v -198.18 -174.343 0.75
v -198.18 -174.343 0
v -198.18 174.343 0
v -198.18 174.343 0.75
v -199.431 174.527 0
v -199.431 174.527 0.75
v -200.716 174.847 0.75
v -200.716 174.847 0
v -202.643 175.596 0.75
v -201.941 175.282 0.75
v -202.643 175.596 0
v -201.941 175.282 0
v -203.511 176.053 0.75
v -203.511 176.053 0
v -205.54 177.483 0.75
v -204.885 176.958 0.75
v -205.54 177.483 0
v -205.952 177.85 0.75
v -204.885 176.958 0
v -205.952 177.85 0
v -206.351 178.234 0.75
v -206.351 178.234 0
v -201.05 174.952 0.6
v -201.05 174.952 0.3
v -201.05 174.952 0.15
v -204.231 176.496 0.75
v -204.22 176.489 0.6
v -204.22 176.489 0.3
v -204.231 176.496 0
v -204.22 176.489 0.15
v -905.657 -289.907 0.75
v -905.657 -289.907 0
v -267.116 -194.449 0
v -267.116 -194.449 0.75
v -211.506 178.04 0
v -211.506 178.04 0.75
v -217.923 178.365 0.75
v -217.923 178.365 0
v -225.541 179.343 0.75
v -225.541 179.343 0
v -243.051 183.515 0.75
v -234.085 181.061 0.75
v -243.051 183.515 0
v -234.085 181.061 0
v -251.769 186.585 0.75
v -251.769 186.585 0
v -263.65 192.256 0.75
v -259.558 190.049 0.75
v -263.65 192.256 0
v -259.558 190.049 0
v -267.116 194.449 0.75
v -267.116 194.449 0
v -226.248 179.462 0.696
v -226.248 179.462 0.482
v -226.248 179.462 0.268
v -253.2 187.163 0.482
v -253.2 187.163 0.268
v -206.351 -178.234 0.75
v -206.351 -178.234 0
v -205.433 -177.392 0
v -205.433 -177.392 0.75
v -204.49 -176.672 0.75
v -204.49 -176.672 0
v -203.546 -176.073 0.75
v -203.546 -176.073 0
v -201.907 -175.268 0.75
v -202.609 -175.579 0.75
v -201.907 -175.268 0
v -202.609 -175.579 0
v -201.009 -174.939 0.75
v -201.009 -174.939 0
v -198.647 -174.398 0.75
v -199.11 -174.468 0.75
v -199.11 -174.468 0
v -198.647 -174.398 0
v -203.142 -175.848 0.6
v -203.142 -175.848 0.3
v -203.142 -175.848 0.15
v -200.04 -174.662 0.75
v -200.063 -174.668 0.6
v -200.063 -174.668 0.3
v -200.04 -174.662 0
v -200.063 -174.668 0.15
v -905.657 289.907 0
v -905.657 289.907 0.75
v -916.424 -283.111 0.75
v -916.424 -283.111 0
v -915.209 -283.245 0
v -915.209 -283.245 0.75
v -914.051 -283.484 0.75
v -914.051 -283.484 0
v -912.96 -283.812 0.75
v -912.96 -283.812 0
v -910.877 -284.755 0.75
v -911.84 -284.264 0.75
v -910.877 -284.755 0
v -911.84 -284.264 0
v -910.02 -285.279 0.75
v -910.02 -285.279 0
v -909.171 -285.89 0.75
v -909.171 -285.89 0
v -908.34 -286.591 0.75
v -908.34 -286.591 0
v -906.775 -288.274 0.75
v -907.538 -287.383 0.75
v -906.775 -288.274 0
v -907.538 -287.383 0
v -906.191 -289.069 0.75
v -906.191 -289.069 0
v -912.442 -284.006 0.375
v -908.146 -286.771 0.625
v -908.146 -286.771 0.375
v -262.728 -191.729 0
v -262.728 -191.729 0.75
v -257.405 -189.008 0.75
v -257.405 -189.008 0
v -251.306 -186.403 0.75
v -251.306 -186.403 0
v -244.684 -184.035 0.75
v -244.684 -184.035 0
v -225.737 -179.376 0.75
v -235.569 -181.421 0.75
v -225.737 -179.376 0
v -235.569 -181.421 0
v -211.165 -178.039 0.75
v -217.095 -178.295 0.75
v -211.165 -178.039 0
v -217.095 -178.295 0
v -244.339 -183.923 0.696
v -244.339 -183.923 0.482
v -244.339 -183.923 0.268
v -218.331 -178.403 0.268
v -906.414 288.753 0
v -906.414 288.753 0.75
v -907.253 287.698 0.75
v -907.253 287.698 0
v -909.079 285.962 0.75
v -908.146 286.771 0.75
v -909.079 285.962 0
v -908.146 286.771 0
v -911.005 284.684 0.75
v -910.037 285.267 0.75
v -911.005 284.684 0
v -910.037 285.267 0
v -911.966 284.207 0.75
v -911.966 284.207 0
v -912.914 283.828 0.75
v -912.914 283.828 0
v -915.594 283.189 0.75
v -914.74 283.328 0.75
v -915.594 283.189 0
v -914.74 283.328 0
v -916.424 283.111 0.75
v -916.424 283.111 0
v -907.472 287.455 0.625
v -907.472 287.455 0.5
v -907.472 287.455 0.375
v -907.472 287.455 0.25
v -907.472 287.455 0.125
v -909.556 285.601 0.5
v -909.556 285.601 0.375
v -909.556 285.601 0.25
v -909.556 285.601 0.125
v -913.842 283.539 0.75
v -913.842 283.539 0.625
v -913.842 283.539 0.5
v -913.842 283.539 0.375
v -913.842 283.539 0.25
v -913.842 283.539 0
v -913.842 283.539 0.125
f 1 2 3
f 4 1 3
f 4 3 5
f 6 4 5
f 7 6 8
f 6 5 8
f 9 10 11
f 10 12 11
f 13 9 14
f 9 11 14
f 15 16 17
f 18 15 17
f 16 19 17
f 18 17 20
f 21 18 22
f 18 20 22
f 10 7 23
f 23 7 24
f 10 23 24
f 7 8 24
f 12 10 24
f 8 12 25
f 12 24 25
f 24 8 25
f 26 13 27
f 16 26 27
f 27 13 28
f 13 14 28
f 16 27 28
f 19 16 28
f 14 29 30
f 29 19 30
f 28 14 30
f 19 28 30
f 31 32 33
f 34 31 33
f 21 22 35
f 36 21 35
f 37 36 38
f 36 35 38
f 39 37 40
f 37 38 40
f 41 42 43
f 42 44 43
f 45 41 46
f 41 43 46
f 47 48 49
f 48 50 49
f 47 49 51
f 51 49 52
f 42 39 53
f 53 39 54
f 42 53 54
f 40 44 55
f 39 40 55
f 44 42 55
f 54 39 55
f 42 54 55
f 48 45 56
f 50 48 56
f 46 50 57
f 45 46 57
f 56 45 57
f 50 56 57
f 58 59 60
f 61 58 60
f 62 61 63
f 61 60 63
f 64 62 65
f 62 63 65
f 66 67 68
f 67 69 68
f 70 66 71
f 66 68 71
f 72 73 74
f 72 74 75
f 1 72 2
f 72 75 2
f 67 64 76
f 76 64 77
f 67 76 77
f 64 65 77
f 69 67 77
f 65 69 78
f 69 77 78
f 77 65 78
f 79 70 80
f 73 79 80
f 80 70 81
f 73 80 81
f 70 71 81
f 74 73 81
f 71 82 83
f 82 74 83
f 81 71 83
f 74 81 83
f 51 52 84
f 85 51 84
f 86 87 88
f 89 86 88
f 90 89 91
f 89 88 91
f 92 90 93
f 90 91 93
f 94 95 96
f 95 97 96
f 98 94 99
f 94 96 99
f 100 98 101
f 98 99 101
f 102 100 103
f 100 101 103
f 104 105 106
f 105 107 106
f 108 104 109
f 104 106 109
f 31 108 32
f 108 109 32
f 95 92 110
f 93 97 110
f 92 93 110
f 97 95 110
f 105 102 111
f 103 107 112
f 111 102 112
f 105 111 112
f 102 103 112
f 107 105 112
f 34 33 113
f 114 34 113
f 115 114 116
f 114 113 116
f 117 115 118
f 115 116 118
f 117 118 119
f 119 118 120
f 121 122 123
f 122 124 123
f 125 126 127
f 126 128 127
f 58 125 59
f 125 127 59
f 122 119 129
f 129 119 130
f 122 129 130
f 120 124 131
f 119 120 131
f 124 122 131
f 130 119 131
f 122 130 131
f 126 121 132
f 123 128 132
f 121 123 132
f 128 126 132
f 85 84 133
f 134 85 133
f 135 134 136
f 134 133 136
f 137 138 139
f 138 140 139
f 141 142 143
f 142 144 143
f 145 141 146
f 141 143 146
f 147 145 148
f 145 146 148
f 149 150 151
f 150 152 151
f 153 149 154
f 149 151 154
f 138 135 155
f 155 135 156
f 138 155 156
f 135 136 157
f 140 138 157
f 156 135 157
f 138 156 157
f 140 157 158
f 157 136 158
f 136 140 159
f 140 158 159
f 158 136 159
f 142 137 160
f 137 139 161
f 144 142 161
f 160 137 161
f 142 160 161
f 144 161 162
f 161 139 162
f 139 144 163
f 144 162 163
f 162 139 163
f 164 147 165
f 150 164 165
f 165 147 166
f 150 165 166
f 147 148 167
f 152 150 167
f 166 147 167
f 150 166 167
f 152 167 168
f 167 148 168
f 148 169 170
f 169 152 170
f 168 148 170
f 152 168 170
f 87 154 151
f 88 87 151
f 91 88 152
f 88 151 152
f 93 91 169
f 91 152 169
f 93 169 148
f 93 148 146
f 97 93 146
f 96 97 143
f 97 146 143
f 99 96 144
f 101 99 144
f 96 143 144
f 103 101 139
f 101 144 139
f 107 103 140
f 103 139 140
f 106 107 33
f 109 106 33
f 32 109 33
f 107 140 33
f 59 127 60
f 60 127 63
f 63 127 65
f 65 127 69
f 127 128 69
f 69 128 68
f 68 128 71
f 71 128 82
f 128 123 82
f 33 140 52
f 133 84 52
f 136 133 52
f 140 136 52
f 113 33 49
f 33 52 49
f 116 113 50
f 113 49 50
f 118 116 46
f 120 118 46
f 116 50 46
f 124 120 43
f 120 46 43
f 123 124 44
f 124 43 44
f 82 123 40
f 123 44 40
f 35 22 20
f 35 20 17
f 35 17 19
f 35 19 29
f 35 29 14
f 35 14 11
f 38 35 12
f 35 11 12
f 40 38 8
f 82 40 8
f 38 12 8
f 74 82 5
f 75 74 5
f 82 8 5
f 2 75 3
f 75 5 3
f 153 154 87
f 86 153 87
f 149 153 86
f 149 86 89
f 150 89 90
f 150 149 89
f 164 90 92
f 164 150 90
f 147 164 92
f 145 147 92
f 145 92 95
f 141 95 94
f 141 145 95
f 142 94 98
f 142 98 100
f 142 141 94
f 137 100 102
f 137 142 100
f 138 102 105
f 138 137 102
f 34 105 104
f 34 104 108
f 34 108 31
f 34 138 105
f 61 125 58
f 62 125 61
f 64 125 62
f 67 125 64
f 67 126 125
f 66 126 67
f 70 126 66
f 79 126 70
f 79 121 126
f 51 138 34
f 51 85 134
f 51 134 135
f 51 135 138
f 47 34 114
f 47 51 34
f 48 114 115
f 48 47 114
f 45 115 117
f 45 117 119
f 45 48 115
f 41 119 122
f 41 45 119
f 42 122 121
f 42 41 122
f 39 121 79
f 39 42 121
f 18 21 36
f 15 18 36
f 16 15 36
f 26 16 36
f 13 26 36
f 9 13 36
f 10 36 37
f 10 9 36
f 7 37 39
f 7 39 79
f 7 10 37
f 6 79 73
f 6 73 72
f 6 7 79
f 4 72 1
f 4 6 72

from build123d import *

# Parameters (mm, degrees)
DODANIE_WYCI_GNI_CIE1_DEPTH = 0.75


with BuildPart() as part:
    # Szkic2 → Dodanie-wyciągnięcie1 (new body)
    with BuildSketch(Plane.XY):
        with BuildLine():
            Line((-198.180056235, -174.343371382), (-198.180056235, 174.343371382))
            add(Edge.make_bspline(
                [(-198.180056235, 174.343371382), (-198.814001088, 174.406171049), (-200.029378534, 174.610462196), (-202.057107029, 175.259966245), (-203.861424394, 176.203690636), (-205.297190597, 177.249011775), (-206.016868944, 177.898350742), (-206.350638573, 178.234256298)],
                knots=[0.983916118, 0.983916118, 0.983916118, 0.983916118, 1.01810112, 1.052286122, 1.086471125, 1.103563626, 1.120656127, 1.120656127, 1.120656127, 1.120656127], degree=3))
            add(Edge.make_bspline(
                [(-206.350638573, 178.234256298), (-206.752993703, 178.198264306), (-207.539928278, 178.138556667), (-209.26679718, 178.051541981), (-211.615353293, 178.018552884), (-214.778879334, 178.117030022), (-219.442272991, 178.45896865), (-226.083190988, 179.327493296), (-235.041515621, 181.174554614), (-244.401007092, 183.815912629), (-251.88971958, 186.553469872), (-257.317102506, 188.930286392), (-261.034871731, 190.768565716), (-263.783209225, 192.309993434), (-265.771886977, 193.543556647), (-266.665075006, 194.137485785), (-267.11637499, 194.44902024)],
                knots=[0.004638779, 0.004638779, 0.004638779, 0.004638779, 0.015597592, 0.026556404, 0.04847403, 0.070391656, 0.092309282, 0.136144533, 0.179979785, 0.223815036, 0.267650288, 0.289567914, 0.311485539, 0.333403165, 0.344361978, 0.355320791, 0.355320791, 0.355320791, 0.355320791], degree=3))
            Line((-267.11637499, 194.44902024), (-905.657427312, 289.90714954))
            add(Edge.make_bspline(
                [(-905.657427312, 289.90714954), (-906.006104535, 289.315247268), (-906.804551959, 288.159312543), (-908.572469256, 286.249166576), (-911.015586006, 284.522093086), (-913.404414633, 283.603556478), (-915.194323394, 283.225046758), (-916.005259178, 283.136981023), (-916.423901621, 283.11129086)],
                knots=[0.312267878, 0.312267878, 0.312267878, 0.312267878, 0.332062336, 0.351856793, 0.391445708, 0.431034623, 0.450829081, 0.470623538, 0.470623538, 0.470623538, 0.470623538], degree=3))
            Line((-916.423901621, 283.11129086), (-916.423901621, -283.11129086))
            add(Edge.make_bspline(
                [(-916.423901621, -283.11129086), (-916.005259178, -283.136981023), (-915.194323394, -283.225046758), (-913.404414633, -283.603556478), (-911.015586006, -284.522093086), (-908.572469256, -286.249166576), (-906.804551959, -288.159312543), (-906.006104535, -289.315247268), (-905.657427312, -289.90714954)],
                knots=[0.029376462, 0.029376462, 0.029376462, 0.029376462, 0.049170919, 0.068965377, 0.108554292, 0.148143207, 0.167937664, 0.187732122, 0.187732122, 0.187732122, 0.187732122], degree=3))
            Line((-905.657427312, -289.90714954), (-267.11637499, -194.44902024))
            add(Edge.make_bspline(
                [(-267.11637499, -194.44902024), (-266.665075006, -194.137485784), (-265.771886977, -193.543556647), (-263.783209225, -192.309993434), (-261.034871731, -190.768565716), (-257.317102506, -188.930286392), (-251.88971958, -186.553469872), (-244.401007092, -183.815912629), (-235.041515621, -181.174554614), (-226.083190988, -179.327493296), (-219.442272991, -178.45896865), (-214.778879334, -178.117030022), (-211.615353293, -178.018552884), (-209.26679718, -178.051541981), (-207.539928278, -178.138556667), (-206.752993703, -178.198264306), (-206.350638573, -178.234256298)],
                knots=[0.644679209, 0.644679209, 0.644679209, 0.644679209, 0.655638022, 0.666596835, 0.688514461, 0.710432086, 0.732349712, 0.776184964, 0.820020215, 0.863855467, 0.907690718, 0.929608344, 0.95152597, 0.973443596, 0.984402408, 0.995361221, 0.995361221, 0.995361221, 0.995361221], degree=3))
            add(Edge.make_bspline(
                [(-206.350638573, -178.234256298), (-206.016868944, -177.898350742), (-205.297190597, -177.249011775), (-203.861424394, -176.203690636), (-202.057107029, -175.259966245), (-200.029378534, -174.610462196), (-198.814001088, -174.406171049), (-198.180056235, -174.343371382)],
                knots=[0.379343873, 0.379343873, 0.379343873, 0.379343873, 0.396436374, 0.413528875, 0.447713878, 0.48189888, 0.516083882, 0.516083882, 0.516083882, 0.516083882], degree=3))
        make_face()
    extrude(amount=DODANIE_WYCI_GNI_CIE1_DEPTH)


solid = part.part
